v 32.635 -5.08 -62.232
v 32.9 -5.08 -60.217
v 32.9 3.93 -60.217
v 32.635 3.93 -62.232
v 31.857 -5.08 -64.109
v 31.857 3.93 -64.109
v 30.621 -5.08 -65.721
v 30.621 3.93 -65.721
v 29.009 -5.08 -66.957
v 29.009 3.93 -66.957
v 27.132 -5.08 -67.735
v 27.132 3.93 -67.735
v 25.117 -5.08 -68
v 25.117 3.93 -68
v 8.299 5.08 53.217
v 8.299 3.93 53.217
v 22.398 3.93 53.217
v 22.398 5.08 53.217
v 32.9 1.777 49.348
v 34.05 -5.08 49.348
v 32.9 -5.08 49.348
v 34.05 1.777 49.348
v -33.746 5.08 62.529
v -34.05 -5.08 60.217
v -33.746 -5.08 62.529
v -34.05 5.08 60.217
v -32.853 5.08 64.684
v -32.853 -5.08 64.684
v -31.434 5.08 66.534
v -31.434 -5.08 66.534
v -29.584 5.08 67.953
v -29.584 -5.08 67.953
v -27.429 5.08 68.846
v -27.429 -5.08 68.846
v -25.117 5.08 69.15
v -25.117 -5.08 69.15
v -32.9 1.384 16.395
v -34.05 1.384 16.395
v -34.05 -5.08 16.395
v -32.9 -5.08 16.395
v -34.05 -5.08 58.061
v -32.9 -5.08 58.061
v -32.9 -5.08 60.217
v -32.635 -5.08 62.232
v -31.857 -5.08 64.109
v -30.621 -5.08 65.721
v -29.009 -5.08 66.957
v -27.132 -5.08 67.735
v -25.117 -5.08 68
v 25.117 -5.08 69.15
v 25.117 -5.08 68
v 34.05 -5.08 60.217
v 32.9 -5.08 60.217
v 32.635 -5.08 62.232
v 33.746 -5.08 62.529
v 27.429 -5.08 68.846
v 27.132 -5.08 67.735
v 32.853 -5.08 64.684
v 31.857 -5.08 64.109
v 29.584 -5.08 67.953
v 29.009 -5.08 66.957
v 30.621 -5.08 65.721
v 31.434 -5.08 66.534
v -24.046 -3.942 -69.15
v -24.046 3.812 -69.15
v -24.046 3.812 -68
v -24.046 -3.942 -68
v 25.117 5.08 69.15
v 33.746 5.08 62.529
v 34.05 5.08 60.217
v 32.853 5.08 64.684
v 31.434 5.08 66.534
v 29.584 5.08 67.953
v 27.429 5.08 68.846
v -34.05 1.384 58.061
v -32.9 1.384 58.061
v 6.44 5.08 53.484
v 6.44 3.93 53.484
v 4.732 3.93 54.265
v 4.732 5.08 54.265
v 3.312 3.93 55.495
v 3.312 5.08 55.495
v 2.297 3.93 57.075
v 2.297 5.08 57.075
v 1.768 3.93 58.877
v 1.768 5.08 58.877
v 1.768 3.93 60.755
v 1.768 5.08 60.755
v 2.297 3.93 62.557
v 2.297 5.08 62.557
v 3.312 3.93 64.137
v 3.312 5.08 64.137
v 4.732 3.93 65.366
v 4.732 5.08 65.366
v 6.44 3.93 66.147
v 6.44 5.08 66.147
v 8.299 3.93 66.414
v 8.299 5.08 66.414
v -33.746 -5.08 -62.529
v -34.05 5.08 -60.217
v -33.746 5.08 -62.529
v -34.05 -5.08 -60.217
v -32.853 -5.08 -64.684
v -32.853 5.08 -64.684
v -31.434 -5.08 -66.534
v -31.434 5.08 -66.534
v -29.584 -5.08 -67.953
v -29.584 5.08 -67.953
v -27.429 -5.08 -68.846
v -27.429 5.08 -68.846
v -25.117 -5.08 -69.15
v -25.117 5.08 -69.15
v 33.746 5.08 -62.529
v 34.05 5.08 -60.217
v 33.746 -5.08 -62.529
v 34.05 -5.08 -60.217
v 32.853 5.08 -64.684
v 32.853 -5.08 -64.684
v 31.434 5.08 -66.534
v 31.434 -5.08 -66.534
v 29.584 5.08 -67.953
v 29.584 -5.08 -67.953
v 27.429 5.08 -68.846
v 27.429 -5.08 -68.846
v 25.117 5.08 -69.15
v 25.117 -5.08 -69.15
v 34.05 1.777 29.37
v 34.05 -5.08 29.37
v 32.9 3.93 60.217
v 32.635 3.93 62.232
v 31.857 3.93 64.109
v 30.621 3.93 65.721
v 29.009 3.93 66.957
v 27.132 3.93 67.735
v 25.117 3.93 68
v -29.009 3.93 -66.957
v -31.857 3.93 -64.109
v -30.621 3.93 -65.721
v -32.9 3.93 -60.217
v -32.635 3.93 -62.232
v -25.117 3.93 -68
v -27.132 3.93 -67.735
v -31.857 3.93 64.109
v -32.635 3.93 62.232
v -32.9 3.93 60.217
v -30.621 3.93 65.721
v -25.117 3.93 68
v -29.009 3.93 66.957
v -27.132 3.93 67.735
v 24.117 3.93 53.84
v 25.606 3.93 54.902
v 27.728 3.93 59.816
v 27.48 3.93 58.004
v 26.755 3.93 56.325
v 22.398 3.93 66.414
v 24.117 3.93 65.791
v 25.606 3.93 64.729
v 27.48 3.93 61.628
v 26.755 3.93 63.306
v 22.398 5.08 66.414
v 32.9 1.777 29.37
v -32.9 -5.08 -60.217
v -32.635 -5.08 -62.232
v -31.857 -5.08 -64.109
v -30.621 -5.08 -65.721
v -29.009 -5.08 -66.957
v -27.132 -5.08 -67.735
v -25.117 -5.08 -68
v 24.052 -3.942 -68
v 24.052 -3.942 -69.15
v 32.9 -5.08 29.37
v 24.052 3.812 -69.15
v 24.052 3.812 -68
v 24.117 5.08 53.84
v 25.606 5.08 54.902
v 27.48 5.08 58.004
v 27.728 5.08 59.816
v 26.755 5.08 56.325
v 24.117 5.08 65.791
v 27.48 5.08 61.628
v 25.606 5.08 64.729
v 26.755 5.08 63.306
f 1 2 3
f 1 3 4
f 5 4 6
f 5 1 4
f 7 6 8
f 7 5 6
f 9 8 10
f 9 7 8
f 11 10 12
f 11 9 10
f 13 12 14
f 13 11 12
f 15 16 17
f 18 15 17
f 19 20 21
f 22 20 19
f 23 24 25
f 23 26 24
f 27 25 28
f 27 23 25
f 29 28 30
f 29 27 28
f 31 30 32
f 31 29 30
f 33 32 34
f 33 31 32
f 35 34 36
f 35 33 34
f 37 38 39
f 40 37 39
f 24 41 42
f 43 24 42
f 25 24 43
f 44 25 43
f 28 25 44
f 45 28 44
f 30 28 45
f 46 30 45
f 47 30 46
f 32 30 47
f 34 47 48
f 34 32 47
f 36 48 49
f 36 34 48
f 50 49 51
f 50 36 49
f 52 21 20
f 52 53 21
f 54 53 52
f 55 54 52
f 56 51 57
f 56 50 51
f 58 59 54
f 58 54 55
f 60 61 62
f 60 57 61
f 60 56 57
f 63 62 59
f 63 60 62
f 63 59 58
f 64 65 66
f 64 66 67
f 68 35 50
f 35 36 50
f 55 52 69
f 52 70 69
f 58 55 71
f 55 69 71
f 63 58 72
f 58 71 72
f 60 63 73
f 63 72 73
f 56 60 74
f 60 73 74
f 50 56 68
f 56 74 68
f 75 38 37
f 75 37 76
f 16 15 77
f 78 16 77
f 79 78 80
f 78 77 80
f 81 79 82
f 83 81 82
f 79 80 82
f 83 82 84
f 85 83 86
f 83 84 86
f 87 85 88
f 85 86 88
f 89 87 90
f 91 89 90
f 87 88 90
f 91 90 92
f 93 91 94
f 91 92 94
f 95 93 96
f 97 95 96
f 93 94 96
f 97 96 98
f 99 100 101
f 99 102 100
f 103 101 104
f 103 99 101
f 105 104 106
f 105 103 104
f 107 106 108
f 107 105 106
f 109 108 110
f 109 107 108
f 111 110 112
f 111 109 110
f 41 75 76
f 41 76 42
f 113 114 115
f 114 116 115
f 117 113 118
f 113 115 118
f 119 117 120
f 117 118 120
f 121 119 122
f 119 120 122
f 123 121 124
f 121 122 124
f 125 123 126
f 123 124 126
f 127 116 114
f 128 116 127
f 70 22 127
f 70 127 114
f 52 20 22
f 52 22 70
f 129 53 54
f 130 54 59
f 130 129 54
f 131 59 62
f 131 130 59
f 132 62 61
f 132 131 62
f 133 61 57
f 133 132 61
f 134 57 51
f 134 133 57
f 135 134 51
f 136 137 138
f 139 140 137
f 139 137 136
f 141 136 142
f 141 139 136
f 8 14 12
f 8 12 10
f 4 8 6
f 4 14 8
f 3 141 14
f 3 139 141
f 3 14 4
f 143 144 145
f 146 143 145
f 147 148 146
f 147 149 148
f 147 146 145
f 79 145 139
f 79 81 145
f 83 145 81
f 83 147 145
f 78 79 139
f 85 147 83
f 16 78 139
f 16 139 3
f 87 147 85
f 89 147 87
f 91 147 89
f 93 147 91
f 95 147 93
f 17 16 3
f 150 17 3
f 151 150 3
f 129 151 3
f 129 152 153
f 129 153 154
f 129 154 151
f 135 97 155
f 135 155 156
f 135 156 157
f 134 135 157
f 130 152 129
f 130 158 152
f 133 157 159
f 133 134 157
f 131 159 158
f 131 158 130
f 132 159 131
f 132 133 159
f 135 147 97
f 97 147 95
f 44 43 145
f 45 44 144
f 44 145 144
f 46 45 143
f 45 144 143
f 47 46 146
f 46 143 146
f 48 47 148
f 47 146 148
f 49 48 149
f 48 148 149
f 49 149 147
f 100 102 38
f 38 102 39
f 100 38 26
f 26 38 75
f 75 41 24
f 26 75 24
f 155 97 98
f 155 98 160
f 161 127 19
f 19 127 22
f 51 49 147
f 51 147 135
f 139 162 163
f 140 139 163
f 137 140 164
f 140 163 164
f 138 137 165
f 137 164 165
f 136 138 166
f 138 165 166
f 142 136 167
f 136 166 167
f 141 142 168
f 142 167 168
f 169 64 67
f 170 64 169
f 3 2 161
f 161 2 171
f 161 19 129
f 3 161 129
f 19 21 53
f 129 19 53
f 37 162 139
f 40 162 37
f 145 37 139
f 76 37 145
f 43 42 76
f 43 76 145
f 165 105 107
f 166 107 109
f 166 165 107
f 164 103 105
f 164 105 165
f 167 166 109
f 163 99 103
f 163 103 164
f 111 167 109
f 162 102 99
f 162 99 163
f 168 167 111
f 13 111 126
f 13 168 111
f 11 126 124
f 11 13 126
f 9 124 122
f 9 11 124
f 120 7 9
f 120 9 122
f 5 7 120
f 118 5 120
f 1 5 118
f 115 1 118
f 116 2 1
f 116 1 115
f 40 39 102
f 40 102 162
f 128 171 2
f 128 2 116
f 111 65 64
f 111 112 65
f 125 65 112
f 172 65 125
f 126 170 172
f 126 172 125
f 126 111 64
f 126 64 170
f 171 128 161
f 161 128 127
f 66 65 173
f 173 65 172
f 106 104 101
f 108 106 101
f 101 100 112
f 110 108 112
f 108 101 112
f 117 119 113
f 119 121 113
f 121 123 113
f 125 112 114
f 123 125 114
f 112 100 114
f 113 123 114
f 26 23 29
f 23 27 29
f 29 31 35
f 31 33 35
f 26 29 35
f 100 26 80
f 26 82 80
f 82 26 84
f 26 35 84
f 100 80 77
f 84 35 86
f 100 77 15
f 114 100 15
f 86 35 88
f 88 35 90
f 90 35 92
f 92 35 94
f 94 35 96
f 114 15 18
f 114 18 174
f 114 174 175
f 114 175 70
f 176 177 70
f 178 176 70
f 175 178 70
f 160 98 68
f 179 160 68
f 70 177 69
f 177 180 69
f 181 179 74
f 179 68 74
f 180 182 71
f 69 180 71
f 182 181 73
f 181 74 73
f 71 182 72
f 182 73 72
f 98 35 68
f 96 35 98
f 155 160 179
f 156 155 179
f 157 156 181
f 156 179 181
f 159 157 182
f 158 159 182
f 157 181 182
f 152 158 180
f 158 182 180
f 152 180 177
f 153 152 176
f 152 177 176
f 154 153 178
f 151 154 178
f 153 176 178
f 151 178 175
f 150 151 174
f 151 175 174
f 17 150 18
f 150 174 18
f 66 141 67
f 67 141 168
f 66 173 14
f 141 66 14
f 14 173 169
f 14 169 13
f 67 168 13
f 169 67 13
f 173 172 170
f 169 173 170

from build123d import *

# Parameters (mm, degrees)
F0_W      = 68.1
F0_H      = 138.3
F1_DEPTH  = 5.08
F2_R      = 8.93259
F3_T      = -1.15
F4_W      = 24.09836
F4_H      = 13.196725
F5_DEPTH  = 12.5
F6_W      = 48.097777
F6_H      = 7.753484
F7_DEPTH  = 12.5
F8_W      = 10.118616
F8_H      = 41.666549
F9_DEPTH  = 12.5
F10_W     = 6.856616
F10_H     = 19.977162
F11_DEPTH = 12.5
F12_SIZE  = 5
F14_DEPTH = 25
F16_DEPTH = 25


with BuildPart() as f1:
    # F0 (on Front) → F1 (new body, symmetric)
    with BuildSketch(Plane.XZ):
        Rectangle(F0_W, F0_H)
    extrude(amount=F1_DEPTH, both=True)

    # F2
    f2_edges = [f1.edges().sort_by_distance(p)[0] for p in [
        (-34.05, 0, 69.15),
        (34.05, 0, 69.15),
        (34.05, 0, -69.15),
        (-34.05, 0, -69.15),
    ]]
    fillet(f2_edges, radius=F2_R)

    # F3
    f3_openings = [f1.faces().sort_by_distance(p)[0] for p in [
        (0, -5.08, 0),
    ]]
    offset(amount=F3_T, openings=f3_openings)

    # F4 (on face) → F5 (cut, symmetric)
    with BuildSketch(Plane.XZ):
        with Locations((15.348363, 59.815576)):
            Rectangle(F4_W, F4_H)
    extrude(amount=F5_DEPTH, both=True, mode=Mode.SUBTRACT)

    # F6 (on face) → F7 (cut, symmetric)
    with BuildSketch(Plane(origin=(0, 0, -69.15), x_dir=(1, 0, 0), z_dir=(0, 0, -1))):
        with Locations((0.003194, 0.064824)):
            Rectangle(F6_W, F6_H)
    extrude(amount=F7_DEPTH, both=True, mode=Mode.SUBTRACT)

    # F8 (on face) → F9 (cut, symmetric)
    with BuildSketch(Plane(origin=(-34.05, 0, 0), x_dir=(0, -1, 0), z_dir=(-1, 0, 0))):
        with Locations((3.675346, 37.227889)):
            Rectangle(F8_W, F8_H)
    extrude(amount=F9_DEPTH, both=True, mode=Mode.SUBTRACT)

    # F10 (on face) → F11 (cut, symmetric)
    with BuildSketch(Plane.YZ.offset(34.05)):
        with Locations((-1.651692, 39.359077)):
            Rectangle(F10_W, F10_H)
    extrude(amount=F11_DEPTH, both=True, mode=Mode.SUBTRACT)

    # F12
    f12_edges = [f1.edges().sort_by_distance(p)[0] for p in [
        (3.299183, 4.505, 66.413939),
        (27.397543, 4.505, 66.413939),
        (27.397543, 4.505, 53.217214),
        (3.299183, 4.505, 53.217214),
    ]]
    chamfer(f12_edges, length=F12_SIZE)

    # F13 (on face) → F14 (cut)
    with BuildSketch(Plane(origin=(0, 5.08, 0), x_dir=(-1, 0, 0), z_dir=(0, 1, 0))):
        with BuildLine():
            Line((-27.397543, 61.413939), (-22.397543, 66.413939))
            ThreePointArc((-22.397543, 66.413939), (-27.728042, 59.815576), (-22.397543, 53.217214))
            Line((-22.397543, 53.217214), (-27.397543, 58.217214))
            Line((-27.397543, 58.217214), (-27.397543, 61.413939))
        make_face()
    extrude(amount=-F14_DEPTH, mode=Mode.SUBTRACT)

    # F15 (on face) → F16 (cut)
    with BuildSketch(Plane(origin=(0, 5.08, 0), x_dir=(-1, 0, 0), z_dir=(0, 1, 0))):
        with BuildLine():
            Line((-3.299183, 58.217214), (-8.299183, 53.217214))
            ThreePointArc((-8.299183, 53.217214), (-1.70082, 59.815576), (-8.299183, 66.413939))
            Line((-8.299183, 66.413939), (-3.299183, 61.413939))
            Line((-3.299183, 61.413939), (-3.299183, 58.217214))
        make_face()
    extrude(amount=-F16_DEPTH, mode=Mode.SUBTRACT)


solid = f1.part
